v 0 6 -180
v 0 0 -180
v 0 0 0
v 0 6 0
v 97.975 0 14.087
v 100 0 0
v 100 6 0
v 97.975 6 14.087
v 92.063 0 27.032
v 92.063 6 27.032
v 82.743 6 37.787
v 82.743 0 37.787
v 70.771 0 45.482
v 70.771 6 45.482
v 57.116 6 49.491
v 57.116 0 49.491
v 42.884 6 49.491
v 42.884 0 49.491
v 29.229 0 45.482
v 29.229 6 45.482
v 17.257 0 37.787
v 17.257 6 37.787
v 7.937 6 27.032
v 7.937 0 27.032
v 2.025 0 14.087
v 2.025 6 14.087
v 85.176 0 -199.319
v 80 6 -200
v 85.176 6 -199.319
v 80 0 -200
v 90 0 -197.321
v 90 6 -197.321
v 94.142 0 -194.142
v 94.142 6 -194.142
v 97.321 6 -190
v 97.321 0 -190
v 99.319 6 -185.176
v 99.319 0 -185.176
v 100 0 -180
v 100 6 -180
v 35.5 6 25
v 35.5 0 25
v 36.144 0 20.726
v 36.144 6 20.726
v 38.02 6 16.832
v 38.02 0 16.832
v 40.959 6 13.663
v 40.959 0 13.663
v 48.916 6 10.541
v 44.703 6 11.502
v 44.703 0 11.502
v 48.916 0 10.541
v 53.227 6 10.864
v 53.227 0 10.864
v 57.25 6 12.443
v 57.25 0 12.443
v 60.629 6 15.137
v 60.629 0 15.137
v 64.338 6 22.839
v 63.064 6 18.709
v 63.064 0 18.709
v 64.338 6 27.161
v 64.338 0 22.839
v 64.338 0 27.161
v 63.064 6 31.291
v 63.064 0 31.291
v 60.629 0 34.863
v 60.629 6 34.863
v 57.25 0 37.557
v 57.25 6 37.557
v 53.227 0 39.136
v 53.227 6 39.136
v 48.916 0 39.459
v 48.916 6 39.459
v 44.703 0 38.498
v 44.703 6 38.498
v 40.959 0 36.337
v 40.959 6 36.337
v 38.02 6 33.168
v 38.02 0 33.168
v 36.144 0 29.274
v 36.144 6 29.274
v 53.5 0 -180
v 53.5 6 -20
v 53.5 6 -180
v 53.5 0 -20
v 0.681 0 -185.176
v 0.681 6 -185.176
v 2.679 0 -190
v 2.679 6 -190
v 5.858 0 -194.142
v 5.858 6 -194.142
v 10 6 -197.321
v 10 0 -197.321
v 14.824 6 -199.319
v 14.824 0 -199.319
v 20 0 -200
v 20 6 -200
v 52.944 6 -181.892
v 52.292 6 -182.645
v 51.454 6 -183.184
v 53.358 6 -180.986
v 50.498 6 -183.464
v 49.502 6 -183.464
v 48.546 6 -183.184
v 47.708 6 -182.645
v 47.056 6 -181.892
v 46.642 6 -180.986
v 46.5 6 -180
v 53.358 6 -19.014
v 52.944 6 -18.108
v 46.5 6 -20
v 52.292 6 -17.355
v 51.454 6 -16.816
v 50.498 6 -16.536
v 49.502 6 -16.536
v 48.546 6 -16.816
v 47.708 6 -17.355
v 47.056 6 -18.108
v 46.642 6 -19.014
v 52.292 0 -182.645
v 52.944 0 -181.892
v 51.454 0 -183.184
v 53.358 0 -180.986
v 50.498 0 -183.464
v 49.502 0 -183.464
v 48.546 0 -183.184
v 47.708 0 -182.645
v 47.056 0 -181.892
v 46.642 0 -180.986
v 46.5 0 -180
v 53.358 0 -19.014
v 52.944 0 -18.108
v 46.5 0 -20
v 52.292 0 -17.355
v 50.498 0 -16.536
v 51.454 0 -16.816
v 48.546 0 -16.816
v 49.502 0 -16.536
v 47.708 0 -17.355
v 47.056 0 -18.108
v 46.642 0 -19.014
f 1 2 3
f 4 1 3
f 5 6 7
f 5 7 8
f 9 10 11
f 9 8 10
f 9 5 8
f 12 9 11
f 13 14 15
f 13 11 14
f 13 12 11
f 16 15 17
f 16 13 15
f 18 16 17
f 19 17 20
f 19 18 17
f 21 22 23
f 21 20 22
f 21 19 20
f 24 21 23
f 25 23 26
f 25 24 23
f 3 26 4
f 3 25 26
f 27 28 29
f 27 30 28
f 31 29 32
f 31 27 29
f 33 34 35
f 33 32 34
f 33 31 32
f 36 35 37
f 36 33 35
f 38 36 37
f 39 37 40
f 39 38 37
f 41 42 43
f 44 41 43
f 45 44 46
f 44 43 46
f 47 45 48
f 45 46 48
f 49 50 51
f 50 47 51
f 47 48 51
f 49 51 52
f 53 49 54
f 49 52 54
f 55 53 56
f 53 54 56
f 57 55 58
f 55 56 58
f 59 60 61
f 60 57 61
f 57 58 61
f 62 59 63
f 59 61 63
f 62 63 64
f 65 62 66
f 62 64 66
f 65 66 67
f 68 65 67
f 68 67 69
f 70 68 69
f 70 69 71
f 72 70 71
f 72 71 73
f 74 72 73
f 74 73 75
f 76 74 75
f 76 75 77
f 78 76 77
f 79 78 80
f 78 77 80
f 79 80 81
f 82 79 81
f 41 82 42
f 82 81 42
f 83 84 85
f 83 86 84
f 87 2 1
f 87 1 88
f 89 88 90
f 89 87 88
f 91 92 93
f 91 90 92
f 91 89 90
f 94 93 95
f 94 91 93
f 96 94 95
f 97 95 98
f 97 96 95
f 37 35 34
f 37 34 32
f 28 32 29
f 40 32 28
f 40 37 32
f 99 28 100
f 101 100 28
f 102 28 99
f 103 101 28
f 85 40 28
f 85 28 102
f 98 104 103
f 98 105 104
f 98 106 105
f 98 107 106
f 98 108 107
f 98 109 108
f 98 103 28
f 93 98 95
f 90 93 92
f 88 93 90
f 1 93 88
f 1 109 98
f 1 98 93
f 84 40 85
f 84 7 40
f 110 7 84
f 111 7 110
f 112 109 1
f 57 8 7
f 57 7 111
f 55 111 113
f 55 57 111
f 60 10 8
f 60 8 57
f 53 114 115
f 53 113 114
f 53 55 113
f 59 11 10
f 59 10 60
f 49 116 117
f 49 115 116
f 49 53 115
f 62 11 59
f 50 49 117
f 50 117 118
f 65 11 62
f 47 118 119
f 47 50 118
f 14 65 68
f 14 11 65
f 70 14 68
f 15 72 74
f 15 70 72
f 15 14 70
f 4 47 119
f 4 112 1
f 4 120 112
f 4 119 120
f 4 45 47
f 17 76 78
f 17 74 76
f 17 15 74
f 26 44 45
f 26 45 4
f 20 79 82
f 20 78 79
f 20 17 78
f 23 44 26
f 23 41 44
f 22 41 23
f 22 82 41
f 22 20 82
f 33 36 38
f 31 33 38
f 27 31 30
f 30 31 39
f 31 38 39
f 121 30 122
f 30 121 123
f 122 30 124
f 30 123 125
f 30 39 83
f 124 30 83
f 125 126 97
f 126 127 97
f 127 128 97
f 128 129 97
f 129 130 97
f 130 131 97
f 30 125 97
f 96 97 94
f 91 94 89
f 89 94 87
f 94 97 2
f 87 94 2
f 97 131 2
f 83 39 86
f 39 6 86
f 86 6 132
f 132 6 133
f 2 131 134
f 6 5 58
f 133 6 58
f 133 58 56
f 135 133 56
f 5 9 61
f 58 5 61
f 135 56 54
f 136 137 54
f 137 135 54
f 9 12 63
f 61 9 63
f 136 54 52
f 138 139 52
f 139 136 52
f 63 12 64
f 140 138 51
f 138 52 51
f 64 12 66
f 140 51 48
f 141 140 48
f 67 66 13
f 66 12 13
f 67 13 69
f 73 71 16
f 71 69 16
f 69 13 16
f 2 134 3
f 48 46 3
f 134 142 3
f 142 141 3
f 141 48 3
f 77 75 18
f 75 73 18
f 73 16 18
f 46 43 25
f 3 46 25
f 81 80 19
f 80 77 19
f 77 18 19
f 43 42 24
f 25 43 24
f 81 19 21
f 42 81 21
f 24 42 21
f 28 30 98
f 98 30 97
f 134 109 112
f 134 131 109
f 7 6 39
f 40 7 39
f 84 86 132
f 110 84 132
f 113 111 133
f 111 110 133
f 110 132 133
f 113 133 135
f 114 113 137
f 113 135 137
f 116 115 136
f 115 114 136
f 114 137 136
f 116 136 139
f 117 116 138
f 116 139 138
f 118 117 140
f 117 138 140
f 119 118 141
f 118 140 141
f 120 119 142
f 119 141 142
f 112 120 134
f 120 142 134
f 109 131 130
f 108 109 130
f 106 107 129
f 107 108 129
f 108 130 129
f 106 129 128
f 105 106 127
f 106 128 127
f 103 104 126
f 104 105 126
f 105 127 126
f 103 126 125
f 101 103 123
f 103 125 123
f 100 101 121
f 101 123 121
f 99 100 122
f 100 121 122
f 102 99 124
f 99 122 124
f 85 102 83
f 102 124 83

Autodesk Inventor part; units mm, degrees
ref_plane "YZ Plane" through (0, 0, 0) normal (1, 0, 0) x (0, 1, 0)
ref_plane "XZ Plane" through (0, 0, 0) normal (0, 1, 0) x (-1, 0, 0)
ref_plane "XY Plane" through (0, 0, 0) normal (0, 0, 1) x (1, 0, 0)
sketch "草圖1" plane through (0, 0, 0) normal (0, 1, 0) x (-1, 0, 0)
  line L0 (-100, 0) -> (-100, -180)
  line L1 (-80, -200) -> (-20, -200)
  line L2 (0, -180) -> (0, 0)
  arc A0 (0, 0) -> (-100, 0) centre (-50, 0) ccw
  arc A1 (-20, -200) -> (0, -180) centre (-20, -180) ccw
  arc A2 (-100, -180) -> (-80, -200) centre (-80, -180) ccw
  line L3 (-50, -180) -> (-50, -20) construction
  line L4 (-46.5, -180) -> (-46.5, -20)
  line L5 (-53.5, -20) -> (-53.5, -180)
  arc A3 (-53.5, -180) -> (-46.5, -180) centre (-50, -180) ccw
  arc A4 (-46.5, -20) -> (-53.5, -20) centre (-50, -20) ccw
  line L6 (-50, -180) -> (110, -180) construction
  line L7 (0, 0) -> (-100, 0) construction
  line L8 (-50, 0) -> (-50, 50) construction
  circle A5 centre (-50, 25) radius 14.5
  point P0 (-50, -100)
  dimension "d5" = 20
  dimension "d6" = 160
  dimension "d7" = 90
  dimension "d8" = 7
  dimension "d12" = 29
sketch "草圖2" plane through (0, 0, 0) normal (0, 1, 0) x (-1, 0, 0)
  line L0 (0, 0) -> (-100, 0)
  line L1 (-50, 0) -> (-50, 50) construction
  circle A0 centre (-50, 25) radius 14.5
  dimension "d9" = 100
  dimension "d10" = 50
  dimension "d11" = 29
extrude "擠出1" add sketch "草圖1" along normal blind 6
